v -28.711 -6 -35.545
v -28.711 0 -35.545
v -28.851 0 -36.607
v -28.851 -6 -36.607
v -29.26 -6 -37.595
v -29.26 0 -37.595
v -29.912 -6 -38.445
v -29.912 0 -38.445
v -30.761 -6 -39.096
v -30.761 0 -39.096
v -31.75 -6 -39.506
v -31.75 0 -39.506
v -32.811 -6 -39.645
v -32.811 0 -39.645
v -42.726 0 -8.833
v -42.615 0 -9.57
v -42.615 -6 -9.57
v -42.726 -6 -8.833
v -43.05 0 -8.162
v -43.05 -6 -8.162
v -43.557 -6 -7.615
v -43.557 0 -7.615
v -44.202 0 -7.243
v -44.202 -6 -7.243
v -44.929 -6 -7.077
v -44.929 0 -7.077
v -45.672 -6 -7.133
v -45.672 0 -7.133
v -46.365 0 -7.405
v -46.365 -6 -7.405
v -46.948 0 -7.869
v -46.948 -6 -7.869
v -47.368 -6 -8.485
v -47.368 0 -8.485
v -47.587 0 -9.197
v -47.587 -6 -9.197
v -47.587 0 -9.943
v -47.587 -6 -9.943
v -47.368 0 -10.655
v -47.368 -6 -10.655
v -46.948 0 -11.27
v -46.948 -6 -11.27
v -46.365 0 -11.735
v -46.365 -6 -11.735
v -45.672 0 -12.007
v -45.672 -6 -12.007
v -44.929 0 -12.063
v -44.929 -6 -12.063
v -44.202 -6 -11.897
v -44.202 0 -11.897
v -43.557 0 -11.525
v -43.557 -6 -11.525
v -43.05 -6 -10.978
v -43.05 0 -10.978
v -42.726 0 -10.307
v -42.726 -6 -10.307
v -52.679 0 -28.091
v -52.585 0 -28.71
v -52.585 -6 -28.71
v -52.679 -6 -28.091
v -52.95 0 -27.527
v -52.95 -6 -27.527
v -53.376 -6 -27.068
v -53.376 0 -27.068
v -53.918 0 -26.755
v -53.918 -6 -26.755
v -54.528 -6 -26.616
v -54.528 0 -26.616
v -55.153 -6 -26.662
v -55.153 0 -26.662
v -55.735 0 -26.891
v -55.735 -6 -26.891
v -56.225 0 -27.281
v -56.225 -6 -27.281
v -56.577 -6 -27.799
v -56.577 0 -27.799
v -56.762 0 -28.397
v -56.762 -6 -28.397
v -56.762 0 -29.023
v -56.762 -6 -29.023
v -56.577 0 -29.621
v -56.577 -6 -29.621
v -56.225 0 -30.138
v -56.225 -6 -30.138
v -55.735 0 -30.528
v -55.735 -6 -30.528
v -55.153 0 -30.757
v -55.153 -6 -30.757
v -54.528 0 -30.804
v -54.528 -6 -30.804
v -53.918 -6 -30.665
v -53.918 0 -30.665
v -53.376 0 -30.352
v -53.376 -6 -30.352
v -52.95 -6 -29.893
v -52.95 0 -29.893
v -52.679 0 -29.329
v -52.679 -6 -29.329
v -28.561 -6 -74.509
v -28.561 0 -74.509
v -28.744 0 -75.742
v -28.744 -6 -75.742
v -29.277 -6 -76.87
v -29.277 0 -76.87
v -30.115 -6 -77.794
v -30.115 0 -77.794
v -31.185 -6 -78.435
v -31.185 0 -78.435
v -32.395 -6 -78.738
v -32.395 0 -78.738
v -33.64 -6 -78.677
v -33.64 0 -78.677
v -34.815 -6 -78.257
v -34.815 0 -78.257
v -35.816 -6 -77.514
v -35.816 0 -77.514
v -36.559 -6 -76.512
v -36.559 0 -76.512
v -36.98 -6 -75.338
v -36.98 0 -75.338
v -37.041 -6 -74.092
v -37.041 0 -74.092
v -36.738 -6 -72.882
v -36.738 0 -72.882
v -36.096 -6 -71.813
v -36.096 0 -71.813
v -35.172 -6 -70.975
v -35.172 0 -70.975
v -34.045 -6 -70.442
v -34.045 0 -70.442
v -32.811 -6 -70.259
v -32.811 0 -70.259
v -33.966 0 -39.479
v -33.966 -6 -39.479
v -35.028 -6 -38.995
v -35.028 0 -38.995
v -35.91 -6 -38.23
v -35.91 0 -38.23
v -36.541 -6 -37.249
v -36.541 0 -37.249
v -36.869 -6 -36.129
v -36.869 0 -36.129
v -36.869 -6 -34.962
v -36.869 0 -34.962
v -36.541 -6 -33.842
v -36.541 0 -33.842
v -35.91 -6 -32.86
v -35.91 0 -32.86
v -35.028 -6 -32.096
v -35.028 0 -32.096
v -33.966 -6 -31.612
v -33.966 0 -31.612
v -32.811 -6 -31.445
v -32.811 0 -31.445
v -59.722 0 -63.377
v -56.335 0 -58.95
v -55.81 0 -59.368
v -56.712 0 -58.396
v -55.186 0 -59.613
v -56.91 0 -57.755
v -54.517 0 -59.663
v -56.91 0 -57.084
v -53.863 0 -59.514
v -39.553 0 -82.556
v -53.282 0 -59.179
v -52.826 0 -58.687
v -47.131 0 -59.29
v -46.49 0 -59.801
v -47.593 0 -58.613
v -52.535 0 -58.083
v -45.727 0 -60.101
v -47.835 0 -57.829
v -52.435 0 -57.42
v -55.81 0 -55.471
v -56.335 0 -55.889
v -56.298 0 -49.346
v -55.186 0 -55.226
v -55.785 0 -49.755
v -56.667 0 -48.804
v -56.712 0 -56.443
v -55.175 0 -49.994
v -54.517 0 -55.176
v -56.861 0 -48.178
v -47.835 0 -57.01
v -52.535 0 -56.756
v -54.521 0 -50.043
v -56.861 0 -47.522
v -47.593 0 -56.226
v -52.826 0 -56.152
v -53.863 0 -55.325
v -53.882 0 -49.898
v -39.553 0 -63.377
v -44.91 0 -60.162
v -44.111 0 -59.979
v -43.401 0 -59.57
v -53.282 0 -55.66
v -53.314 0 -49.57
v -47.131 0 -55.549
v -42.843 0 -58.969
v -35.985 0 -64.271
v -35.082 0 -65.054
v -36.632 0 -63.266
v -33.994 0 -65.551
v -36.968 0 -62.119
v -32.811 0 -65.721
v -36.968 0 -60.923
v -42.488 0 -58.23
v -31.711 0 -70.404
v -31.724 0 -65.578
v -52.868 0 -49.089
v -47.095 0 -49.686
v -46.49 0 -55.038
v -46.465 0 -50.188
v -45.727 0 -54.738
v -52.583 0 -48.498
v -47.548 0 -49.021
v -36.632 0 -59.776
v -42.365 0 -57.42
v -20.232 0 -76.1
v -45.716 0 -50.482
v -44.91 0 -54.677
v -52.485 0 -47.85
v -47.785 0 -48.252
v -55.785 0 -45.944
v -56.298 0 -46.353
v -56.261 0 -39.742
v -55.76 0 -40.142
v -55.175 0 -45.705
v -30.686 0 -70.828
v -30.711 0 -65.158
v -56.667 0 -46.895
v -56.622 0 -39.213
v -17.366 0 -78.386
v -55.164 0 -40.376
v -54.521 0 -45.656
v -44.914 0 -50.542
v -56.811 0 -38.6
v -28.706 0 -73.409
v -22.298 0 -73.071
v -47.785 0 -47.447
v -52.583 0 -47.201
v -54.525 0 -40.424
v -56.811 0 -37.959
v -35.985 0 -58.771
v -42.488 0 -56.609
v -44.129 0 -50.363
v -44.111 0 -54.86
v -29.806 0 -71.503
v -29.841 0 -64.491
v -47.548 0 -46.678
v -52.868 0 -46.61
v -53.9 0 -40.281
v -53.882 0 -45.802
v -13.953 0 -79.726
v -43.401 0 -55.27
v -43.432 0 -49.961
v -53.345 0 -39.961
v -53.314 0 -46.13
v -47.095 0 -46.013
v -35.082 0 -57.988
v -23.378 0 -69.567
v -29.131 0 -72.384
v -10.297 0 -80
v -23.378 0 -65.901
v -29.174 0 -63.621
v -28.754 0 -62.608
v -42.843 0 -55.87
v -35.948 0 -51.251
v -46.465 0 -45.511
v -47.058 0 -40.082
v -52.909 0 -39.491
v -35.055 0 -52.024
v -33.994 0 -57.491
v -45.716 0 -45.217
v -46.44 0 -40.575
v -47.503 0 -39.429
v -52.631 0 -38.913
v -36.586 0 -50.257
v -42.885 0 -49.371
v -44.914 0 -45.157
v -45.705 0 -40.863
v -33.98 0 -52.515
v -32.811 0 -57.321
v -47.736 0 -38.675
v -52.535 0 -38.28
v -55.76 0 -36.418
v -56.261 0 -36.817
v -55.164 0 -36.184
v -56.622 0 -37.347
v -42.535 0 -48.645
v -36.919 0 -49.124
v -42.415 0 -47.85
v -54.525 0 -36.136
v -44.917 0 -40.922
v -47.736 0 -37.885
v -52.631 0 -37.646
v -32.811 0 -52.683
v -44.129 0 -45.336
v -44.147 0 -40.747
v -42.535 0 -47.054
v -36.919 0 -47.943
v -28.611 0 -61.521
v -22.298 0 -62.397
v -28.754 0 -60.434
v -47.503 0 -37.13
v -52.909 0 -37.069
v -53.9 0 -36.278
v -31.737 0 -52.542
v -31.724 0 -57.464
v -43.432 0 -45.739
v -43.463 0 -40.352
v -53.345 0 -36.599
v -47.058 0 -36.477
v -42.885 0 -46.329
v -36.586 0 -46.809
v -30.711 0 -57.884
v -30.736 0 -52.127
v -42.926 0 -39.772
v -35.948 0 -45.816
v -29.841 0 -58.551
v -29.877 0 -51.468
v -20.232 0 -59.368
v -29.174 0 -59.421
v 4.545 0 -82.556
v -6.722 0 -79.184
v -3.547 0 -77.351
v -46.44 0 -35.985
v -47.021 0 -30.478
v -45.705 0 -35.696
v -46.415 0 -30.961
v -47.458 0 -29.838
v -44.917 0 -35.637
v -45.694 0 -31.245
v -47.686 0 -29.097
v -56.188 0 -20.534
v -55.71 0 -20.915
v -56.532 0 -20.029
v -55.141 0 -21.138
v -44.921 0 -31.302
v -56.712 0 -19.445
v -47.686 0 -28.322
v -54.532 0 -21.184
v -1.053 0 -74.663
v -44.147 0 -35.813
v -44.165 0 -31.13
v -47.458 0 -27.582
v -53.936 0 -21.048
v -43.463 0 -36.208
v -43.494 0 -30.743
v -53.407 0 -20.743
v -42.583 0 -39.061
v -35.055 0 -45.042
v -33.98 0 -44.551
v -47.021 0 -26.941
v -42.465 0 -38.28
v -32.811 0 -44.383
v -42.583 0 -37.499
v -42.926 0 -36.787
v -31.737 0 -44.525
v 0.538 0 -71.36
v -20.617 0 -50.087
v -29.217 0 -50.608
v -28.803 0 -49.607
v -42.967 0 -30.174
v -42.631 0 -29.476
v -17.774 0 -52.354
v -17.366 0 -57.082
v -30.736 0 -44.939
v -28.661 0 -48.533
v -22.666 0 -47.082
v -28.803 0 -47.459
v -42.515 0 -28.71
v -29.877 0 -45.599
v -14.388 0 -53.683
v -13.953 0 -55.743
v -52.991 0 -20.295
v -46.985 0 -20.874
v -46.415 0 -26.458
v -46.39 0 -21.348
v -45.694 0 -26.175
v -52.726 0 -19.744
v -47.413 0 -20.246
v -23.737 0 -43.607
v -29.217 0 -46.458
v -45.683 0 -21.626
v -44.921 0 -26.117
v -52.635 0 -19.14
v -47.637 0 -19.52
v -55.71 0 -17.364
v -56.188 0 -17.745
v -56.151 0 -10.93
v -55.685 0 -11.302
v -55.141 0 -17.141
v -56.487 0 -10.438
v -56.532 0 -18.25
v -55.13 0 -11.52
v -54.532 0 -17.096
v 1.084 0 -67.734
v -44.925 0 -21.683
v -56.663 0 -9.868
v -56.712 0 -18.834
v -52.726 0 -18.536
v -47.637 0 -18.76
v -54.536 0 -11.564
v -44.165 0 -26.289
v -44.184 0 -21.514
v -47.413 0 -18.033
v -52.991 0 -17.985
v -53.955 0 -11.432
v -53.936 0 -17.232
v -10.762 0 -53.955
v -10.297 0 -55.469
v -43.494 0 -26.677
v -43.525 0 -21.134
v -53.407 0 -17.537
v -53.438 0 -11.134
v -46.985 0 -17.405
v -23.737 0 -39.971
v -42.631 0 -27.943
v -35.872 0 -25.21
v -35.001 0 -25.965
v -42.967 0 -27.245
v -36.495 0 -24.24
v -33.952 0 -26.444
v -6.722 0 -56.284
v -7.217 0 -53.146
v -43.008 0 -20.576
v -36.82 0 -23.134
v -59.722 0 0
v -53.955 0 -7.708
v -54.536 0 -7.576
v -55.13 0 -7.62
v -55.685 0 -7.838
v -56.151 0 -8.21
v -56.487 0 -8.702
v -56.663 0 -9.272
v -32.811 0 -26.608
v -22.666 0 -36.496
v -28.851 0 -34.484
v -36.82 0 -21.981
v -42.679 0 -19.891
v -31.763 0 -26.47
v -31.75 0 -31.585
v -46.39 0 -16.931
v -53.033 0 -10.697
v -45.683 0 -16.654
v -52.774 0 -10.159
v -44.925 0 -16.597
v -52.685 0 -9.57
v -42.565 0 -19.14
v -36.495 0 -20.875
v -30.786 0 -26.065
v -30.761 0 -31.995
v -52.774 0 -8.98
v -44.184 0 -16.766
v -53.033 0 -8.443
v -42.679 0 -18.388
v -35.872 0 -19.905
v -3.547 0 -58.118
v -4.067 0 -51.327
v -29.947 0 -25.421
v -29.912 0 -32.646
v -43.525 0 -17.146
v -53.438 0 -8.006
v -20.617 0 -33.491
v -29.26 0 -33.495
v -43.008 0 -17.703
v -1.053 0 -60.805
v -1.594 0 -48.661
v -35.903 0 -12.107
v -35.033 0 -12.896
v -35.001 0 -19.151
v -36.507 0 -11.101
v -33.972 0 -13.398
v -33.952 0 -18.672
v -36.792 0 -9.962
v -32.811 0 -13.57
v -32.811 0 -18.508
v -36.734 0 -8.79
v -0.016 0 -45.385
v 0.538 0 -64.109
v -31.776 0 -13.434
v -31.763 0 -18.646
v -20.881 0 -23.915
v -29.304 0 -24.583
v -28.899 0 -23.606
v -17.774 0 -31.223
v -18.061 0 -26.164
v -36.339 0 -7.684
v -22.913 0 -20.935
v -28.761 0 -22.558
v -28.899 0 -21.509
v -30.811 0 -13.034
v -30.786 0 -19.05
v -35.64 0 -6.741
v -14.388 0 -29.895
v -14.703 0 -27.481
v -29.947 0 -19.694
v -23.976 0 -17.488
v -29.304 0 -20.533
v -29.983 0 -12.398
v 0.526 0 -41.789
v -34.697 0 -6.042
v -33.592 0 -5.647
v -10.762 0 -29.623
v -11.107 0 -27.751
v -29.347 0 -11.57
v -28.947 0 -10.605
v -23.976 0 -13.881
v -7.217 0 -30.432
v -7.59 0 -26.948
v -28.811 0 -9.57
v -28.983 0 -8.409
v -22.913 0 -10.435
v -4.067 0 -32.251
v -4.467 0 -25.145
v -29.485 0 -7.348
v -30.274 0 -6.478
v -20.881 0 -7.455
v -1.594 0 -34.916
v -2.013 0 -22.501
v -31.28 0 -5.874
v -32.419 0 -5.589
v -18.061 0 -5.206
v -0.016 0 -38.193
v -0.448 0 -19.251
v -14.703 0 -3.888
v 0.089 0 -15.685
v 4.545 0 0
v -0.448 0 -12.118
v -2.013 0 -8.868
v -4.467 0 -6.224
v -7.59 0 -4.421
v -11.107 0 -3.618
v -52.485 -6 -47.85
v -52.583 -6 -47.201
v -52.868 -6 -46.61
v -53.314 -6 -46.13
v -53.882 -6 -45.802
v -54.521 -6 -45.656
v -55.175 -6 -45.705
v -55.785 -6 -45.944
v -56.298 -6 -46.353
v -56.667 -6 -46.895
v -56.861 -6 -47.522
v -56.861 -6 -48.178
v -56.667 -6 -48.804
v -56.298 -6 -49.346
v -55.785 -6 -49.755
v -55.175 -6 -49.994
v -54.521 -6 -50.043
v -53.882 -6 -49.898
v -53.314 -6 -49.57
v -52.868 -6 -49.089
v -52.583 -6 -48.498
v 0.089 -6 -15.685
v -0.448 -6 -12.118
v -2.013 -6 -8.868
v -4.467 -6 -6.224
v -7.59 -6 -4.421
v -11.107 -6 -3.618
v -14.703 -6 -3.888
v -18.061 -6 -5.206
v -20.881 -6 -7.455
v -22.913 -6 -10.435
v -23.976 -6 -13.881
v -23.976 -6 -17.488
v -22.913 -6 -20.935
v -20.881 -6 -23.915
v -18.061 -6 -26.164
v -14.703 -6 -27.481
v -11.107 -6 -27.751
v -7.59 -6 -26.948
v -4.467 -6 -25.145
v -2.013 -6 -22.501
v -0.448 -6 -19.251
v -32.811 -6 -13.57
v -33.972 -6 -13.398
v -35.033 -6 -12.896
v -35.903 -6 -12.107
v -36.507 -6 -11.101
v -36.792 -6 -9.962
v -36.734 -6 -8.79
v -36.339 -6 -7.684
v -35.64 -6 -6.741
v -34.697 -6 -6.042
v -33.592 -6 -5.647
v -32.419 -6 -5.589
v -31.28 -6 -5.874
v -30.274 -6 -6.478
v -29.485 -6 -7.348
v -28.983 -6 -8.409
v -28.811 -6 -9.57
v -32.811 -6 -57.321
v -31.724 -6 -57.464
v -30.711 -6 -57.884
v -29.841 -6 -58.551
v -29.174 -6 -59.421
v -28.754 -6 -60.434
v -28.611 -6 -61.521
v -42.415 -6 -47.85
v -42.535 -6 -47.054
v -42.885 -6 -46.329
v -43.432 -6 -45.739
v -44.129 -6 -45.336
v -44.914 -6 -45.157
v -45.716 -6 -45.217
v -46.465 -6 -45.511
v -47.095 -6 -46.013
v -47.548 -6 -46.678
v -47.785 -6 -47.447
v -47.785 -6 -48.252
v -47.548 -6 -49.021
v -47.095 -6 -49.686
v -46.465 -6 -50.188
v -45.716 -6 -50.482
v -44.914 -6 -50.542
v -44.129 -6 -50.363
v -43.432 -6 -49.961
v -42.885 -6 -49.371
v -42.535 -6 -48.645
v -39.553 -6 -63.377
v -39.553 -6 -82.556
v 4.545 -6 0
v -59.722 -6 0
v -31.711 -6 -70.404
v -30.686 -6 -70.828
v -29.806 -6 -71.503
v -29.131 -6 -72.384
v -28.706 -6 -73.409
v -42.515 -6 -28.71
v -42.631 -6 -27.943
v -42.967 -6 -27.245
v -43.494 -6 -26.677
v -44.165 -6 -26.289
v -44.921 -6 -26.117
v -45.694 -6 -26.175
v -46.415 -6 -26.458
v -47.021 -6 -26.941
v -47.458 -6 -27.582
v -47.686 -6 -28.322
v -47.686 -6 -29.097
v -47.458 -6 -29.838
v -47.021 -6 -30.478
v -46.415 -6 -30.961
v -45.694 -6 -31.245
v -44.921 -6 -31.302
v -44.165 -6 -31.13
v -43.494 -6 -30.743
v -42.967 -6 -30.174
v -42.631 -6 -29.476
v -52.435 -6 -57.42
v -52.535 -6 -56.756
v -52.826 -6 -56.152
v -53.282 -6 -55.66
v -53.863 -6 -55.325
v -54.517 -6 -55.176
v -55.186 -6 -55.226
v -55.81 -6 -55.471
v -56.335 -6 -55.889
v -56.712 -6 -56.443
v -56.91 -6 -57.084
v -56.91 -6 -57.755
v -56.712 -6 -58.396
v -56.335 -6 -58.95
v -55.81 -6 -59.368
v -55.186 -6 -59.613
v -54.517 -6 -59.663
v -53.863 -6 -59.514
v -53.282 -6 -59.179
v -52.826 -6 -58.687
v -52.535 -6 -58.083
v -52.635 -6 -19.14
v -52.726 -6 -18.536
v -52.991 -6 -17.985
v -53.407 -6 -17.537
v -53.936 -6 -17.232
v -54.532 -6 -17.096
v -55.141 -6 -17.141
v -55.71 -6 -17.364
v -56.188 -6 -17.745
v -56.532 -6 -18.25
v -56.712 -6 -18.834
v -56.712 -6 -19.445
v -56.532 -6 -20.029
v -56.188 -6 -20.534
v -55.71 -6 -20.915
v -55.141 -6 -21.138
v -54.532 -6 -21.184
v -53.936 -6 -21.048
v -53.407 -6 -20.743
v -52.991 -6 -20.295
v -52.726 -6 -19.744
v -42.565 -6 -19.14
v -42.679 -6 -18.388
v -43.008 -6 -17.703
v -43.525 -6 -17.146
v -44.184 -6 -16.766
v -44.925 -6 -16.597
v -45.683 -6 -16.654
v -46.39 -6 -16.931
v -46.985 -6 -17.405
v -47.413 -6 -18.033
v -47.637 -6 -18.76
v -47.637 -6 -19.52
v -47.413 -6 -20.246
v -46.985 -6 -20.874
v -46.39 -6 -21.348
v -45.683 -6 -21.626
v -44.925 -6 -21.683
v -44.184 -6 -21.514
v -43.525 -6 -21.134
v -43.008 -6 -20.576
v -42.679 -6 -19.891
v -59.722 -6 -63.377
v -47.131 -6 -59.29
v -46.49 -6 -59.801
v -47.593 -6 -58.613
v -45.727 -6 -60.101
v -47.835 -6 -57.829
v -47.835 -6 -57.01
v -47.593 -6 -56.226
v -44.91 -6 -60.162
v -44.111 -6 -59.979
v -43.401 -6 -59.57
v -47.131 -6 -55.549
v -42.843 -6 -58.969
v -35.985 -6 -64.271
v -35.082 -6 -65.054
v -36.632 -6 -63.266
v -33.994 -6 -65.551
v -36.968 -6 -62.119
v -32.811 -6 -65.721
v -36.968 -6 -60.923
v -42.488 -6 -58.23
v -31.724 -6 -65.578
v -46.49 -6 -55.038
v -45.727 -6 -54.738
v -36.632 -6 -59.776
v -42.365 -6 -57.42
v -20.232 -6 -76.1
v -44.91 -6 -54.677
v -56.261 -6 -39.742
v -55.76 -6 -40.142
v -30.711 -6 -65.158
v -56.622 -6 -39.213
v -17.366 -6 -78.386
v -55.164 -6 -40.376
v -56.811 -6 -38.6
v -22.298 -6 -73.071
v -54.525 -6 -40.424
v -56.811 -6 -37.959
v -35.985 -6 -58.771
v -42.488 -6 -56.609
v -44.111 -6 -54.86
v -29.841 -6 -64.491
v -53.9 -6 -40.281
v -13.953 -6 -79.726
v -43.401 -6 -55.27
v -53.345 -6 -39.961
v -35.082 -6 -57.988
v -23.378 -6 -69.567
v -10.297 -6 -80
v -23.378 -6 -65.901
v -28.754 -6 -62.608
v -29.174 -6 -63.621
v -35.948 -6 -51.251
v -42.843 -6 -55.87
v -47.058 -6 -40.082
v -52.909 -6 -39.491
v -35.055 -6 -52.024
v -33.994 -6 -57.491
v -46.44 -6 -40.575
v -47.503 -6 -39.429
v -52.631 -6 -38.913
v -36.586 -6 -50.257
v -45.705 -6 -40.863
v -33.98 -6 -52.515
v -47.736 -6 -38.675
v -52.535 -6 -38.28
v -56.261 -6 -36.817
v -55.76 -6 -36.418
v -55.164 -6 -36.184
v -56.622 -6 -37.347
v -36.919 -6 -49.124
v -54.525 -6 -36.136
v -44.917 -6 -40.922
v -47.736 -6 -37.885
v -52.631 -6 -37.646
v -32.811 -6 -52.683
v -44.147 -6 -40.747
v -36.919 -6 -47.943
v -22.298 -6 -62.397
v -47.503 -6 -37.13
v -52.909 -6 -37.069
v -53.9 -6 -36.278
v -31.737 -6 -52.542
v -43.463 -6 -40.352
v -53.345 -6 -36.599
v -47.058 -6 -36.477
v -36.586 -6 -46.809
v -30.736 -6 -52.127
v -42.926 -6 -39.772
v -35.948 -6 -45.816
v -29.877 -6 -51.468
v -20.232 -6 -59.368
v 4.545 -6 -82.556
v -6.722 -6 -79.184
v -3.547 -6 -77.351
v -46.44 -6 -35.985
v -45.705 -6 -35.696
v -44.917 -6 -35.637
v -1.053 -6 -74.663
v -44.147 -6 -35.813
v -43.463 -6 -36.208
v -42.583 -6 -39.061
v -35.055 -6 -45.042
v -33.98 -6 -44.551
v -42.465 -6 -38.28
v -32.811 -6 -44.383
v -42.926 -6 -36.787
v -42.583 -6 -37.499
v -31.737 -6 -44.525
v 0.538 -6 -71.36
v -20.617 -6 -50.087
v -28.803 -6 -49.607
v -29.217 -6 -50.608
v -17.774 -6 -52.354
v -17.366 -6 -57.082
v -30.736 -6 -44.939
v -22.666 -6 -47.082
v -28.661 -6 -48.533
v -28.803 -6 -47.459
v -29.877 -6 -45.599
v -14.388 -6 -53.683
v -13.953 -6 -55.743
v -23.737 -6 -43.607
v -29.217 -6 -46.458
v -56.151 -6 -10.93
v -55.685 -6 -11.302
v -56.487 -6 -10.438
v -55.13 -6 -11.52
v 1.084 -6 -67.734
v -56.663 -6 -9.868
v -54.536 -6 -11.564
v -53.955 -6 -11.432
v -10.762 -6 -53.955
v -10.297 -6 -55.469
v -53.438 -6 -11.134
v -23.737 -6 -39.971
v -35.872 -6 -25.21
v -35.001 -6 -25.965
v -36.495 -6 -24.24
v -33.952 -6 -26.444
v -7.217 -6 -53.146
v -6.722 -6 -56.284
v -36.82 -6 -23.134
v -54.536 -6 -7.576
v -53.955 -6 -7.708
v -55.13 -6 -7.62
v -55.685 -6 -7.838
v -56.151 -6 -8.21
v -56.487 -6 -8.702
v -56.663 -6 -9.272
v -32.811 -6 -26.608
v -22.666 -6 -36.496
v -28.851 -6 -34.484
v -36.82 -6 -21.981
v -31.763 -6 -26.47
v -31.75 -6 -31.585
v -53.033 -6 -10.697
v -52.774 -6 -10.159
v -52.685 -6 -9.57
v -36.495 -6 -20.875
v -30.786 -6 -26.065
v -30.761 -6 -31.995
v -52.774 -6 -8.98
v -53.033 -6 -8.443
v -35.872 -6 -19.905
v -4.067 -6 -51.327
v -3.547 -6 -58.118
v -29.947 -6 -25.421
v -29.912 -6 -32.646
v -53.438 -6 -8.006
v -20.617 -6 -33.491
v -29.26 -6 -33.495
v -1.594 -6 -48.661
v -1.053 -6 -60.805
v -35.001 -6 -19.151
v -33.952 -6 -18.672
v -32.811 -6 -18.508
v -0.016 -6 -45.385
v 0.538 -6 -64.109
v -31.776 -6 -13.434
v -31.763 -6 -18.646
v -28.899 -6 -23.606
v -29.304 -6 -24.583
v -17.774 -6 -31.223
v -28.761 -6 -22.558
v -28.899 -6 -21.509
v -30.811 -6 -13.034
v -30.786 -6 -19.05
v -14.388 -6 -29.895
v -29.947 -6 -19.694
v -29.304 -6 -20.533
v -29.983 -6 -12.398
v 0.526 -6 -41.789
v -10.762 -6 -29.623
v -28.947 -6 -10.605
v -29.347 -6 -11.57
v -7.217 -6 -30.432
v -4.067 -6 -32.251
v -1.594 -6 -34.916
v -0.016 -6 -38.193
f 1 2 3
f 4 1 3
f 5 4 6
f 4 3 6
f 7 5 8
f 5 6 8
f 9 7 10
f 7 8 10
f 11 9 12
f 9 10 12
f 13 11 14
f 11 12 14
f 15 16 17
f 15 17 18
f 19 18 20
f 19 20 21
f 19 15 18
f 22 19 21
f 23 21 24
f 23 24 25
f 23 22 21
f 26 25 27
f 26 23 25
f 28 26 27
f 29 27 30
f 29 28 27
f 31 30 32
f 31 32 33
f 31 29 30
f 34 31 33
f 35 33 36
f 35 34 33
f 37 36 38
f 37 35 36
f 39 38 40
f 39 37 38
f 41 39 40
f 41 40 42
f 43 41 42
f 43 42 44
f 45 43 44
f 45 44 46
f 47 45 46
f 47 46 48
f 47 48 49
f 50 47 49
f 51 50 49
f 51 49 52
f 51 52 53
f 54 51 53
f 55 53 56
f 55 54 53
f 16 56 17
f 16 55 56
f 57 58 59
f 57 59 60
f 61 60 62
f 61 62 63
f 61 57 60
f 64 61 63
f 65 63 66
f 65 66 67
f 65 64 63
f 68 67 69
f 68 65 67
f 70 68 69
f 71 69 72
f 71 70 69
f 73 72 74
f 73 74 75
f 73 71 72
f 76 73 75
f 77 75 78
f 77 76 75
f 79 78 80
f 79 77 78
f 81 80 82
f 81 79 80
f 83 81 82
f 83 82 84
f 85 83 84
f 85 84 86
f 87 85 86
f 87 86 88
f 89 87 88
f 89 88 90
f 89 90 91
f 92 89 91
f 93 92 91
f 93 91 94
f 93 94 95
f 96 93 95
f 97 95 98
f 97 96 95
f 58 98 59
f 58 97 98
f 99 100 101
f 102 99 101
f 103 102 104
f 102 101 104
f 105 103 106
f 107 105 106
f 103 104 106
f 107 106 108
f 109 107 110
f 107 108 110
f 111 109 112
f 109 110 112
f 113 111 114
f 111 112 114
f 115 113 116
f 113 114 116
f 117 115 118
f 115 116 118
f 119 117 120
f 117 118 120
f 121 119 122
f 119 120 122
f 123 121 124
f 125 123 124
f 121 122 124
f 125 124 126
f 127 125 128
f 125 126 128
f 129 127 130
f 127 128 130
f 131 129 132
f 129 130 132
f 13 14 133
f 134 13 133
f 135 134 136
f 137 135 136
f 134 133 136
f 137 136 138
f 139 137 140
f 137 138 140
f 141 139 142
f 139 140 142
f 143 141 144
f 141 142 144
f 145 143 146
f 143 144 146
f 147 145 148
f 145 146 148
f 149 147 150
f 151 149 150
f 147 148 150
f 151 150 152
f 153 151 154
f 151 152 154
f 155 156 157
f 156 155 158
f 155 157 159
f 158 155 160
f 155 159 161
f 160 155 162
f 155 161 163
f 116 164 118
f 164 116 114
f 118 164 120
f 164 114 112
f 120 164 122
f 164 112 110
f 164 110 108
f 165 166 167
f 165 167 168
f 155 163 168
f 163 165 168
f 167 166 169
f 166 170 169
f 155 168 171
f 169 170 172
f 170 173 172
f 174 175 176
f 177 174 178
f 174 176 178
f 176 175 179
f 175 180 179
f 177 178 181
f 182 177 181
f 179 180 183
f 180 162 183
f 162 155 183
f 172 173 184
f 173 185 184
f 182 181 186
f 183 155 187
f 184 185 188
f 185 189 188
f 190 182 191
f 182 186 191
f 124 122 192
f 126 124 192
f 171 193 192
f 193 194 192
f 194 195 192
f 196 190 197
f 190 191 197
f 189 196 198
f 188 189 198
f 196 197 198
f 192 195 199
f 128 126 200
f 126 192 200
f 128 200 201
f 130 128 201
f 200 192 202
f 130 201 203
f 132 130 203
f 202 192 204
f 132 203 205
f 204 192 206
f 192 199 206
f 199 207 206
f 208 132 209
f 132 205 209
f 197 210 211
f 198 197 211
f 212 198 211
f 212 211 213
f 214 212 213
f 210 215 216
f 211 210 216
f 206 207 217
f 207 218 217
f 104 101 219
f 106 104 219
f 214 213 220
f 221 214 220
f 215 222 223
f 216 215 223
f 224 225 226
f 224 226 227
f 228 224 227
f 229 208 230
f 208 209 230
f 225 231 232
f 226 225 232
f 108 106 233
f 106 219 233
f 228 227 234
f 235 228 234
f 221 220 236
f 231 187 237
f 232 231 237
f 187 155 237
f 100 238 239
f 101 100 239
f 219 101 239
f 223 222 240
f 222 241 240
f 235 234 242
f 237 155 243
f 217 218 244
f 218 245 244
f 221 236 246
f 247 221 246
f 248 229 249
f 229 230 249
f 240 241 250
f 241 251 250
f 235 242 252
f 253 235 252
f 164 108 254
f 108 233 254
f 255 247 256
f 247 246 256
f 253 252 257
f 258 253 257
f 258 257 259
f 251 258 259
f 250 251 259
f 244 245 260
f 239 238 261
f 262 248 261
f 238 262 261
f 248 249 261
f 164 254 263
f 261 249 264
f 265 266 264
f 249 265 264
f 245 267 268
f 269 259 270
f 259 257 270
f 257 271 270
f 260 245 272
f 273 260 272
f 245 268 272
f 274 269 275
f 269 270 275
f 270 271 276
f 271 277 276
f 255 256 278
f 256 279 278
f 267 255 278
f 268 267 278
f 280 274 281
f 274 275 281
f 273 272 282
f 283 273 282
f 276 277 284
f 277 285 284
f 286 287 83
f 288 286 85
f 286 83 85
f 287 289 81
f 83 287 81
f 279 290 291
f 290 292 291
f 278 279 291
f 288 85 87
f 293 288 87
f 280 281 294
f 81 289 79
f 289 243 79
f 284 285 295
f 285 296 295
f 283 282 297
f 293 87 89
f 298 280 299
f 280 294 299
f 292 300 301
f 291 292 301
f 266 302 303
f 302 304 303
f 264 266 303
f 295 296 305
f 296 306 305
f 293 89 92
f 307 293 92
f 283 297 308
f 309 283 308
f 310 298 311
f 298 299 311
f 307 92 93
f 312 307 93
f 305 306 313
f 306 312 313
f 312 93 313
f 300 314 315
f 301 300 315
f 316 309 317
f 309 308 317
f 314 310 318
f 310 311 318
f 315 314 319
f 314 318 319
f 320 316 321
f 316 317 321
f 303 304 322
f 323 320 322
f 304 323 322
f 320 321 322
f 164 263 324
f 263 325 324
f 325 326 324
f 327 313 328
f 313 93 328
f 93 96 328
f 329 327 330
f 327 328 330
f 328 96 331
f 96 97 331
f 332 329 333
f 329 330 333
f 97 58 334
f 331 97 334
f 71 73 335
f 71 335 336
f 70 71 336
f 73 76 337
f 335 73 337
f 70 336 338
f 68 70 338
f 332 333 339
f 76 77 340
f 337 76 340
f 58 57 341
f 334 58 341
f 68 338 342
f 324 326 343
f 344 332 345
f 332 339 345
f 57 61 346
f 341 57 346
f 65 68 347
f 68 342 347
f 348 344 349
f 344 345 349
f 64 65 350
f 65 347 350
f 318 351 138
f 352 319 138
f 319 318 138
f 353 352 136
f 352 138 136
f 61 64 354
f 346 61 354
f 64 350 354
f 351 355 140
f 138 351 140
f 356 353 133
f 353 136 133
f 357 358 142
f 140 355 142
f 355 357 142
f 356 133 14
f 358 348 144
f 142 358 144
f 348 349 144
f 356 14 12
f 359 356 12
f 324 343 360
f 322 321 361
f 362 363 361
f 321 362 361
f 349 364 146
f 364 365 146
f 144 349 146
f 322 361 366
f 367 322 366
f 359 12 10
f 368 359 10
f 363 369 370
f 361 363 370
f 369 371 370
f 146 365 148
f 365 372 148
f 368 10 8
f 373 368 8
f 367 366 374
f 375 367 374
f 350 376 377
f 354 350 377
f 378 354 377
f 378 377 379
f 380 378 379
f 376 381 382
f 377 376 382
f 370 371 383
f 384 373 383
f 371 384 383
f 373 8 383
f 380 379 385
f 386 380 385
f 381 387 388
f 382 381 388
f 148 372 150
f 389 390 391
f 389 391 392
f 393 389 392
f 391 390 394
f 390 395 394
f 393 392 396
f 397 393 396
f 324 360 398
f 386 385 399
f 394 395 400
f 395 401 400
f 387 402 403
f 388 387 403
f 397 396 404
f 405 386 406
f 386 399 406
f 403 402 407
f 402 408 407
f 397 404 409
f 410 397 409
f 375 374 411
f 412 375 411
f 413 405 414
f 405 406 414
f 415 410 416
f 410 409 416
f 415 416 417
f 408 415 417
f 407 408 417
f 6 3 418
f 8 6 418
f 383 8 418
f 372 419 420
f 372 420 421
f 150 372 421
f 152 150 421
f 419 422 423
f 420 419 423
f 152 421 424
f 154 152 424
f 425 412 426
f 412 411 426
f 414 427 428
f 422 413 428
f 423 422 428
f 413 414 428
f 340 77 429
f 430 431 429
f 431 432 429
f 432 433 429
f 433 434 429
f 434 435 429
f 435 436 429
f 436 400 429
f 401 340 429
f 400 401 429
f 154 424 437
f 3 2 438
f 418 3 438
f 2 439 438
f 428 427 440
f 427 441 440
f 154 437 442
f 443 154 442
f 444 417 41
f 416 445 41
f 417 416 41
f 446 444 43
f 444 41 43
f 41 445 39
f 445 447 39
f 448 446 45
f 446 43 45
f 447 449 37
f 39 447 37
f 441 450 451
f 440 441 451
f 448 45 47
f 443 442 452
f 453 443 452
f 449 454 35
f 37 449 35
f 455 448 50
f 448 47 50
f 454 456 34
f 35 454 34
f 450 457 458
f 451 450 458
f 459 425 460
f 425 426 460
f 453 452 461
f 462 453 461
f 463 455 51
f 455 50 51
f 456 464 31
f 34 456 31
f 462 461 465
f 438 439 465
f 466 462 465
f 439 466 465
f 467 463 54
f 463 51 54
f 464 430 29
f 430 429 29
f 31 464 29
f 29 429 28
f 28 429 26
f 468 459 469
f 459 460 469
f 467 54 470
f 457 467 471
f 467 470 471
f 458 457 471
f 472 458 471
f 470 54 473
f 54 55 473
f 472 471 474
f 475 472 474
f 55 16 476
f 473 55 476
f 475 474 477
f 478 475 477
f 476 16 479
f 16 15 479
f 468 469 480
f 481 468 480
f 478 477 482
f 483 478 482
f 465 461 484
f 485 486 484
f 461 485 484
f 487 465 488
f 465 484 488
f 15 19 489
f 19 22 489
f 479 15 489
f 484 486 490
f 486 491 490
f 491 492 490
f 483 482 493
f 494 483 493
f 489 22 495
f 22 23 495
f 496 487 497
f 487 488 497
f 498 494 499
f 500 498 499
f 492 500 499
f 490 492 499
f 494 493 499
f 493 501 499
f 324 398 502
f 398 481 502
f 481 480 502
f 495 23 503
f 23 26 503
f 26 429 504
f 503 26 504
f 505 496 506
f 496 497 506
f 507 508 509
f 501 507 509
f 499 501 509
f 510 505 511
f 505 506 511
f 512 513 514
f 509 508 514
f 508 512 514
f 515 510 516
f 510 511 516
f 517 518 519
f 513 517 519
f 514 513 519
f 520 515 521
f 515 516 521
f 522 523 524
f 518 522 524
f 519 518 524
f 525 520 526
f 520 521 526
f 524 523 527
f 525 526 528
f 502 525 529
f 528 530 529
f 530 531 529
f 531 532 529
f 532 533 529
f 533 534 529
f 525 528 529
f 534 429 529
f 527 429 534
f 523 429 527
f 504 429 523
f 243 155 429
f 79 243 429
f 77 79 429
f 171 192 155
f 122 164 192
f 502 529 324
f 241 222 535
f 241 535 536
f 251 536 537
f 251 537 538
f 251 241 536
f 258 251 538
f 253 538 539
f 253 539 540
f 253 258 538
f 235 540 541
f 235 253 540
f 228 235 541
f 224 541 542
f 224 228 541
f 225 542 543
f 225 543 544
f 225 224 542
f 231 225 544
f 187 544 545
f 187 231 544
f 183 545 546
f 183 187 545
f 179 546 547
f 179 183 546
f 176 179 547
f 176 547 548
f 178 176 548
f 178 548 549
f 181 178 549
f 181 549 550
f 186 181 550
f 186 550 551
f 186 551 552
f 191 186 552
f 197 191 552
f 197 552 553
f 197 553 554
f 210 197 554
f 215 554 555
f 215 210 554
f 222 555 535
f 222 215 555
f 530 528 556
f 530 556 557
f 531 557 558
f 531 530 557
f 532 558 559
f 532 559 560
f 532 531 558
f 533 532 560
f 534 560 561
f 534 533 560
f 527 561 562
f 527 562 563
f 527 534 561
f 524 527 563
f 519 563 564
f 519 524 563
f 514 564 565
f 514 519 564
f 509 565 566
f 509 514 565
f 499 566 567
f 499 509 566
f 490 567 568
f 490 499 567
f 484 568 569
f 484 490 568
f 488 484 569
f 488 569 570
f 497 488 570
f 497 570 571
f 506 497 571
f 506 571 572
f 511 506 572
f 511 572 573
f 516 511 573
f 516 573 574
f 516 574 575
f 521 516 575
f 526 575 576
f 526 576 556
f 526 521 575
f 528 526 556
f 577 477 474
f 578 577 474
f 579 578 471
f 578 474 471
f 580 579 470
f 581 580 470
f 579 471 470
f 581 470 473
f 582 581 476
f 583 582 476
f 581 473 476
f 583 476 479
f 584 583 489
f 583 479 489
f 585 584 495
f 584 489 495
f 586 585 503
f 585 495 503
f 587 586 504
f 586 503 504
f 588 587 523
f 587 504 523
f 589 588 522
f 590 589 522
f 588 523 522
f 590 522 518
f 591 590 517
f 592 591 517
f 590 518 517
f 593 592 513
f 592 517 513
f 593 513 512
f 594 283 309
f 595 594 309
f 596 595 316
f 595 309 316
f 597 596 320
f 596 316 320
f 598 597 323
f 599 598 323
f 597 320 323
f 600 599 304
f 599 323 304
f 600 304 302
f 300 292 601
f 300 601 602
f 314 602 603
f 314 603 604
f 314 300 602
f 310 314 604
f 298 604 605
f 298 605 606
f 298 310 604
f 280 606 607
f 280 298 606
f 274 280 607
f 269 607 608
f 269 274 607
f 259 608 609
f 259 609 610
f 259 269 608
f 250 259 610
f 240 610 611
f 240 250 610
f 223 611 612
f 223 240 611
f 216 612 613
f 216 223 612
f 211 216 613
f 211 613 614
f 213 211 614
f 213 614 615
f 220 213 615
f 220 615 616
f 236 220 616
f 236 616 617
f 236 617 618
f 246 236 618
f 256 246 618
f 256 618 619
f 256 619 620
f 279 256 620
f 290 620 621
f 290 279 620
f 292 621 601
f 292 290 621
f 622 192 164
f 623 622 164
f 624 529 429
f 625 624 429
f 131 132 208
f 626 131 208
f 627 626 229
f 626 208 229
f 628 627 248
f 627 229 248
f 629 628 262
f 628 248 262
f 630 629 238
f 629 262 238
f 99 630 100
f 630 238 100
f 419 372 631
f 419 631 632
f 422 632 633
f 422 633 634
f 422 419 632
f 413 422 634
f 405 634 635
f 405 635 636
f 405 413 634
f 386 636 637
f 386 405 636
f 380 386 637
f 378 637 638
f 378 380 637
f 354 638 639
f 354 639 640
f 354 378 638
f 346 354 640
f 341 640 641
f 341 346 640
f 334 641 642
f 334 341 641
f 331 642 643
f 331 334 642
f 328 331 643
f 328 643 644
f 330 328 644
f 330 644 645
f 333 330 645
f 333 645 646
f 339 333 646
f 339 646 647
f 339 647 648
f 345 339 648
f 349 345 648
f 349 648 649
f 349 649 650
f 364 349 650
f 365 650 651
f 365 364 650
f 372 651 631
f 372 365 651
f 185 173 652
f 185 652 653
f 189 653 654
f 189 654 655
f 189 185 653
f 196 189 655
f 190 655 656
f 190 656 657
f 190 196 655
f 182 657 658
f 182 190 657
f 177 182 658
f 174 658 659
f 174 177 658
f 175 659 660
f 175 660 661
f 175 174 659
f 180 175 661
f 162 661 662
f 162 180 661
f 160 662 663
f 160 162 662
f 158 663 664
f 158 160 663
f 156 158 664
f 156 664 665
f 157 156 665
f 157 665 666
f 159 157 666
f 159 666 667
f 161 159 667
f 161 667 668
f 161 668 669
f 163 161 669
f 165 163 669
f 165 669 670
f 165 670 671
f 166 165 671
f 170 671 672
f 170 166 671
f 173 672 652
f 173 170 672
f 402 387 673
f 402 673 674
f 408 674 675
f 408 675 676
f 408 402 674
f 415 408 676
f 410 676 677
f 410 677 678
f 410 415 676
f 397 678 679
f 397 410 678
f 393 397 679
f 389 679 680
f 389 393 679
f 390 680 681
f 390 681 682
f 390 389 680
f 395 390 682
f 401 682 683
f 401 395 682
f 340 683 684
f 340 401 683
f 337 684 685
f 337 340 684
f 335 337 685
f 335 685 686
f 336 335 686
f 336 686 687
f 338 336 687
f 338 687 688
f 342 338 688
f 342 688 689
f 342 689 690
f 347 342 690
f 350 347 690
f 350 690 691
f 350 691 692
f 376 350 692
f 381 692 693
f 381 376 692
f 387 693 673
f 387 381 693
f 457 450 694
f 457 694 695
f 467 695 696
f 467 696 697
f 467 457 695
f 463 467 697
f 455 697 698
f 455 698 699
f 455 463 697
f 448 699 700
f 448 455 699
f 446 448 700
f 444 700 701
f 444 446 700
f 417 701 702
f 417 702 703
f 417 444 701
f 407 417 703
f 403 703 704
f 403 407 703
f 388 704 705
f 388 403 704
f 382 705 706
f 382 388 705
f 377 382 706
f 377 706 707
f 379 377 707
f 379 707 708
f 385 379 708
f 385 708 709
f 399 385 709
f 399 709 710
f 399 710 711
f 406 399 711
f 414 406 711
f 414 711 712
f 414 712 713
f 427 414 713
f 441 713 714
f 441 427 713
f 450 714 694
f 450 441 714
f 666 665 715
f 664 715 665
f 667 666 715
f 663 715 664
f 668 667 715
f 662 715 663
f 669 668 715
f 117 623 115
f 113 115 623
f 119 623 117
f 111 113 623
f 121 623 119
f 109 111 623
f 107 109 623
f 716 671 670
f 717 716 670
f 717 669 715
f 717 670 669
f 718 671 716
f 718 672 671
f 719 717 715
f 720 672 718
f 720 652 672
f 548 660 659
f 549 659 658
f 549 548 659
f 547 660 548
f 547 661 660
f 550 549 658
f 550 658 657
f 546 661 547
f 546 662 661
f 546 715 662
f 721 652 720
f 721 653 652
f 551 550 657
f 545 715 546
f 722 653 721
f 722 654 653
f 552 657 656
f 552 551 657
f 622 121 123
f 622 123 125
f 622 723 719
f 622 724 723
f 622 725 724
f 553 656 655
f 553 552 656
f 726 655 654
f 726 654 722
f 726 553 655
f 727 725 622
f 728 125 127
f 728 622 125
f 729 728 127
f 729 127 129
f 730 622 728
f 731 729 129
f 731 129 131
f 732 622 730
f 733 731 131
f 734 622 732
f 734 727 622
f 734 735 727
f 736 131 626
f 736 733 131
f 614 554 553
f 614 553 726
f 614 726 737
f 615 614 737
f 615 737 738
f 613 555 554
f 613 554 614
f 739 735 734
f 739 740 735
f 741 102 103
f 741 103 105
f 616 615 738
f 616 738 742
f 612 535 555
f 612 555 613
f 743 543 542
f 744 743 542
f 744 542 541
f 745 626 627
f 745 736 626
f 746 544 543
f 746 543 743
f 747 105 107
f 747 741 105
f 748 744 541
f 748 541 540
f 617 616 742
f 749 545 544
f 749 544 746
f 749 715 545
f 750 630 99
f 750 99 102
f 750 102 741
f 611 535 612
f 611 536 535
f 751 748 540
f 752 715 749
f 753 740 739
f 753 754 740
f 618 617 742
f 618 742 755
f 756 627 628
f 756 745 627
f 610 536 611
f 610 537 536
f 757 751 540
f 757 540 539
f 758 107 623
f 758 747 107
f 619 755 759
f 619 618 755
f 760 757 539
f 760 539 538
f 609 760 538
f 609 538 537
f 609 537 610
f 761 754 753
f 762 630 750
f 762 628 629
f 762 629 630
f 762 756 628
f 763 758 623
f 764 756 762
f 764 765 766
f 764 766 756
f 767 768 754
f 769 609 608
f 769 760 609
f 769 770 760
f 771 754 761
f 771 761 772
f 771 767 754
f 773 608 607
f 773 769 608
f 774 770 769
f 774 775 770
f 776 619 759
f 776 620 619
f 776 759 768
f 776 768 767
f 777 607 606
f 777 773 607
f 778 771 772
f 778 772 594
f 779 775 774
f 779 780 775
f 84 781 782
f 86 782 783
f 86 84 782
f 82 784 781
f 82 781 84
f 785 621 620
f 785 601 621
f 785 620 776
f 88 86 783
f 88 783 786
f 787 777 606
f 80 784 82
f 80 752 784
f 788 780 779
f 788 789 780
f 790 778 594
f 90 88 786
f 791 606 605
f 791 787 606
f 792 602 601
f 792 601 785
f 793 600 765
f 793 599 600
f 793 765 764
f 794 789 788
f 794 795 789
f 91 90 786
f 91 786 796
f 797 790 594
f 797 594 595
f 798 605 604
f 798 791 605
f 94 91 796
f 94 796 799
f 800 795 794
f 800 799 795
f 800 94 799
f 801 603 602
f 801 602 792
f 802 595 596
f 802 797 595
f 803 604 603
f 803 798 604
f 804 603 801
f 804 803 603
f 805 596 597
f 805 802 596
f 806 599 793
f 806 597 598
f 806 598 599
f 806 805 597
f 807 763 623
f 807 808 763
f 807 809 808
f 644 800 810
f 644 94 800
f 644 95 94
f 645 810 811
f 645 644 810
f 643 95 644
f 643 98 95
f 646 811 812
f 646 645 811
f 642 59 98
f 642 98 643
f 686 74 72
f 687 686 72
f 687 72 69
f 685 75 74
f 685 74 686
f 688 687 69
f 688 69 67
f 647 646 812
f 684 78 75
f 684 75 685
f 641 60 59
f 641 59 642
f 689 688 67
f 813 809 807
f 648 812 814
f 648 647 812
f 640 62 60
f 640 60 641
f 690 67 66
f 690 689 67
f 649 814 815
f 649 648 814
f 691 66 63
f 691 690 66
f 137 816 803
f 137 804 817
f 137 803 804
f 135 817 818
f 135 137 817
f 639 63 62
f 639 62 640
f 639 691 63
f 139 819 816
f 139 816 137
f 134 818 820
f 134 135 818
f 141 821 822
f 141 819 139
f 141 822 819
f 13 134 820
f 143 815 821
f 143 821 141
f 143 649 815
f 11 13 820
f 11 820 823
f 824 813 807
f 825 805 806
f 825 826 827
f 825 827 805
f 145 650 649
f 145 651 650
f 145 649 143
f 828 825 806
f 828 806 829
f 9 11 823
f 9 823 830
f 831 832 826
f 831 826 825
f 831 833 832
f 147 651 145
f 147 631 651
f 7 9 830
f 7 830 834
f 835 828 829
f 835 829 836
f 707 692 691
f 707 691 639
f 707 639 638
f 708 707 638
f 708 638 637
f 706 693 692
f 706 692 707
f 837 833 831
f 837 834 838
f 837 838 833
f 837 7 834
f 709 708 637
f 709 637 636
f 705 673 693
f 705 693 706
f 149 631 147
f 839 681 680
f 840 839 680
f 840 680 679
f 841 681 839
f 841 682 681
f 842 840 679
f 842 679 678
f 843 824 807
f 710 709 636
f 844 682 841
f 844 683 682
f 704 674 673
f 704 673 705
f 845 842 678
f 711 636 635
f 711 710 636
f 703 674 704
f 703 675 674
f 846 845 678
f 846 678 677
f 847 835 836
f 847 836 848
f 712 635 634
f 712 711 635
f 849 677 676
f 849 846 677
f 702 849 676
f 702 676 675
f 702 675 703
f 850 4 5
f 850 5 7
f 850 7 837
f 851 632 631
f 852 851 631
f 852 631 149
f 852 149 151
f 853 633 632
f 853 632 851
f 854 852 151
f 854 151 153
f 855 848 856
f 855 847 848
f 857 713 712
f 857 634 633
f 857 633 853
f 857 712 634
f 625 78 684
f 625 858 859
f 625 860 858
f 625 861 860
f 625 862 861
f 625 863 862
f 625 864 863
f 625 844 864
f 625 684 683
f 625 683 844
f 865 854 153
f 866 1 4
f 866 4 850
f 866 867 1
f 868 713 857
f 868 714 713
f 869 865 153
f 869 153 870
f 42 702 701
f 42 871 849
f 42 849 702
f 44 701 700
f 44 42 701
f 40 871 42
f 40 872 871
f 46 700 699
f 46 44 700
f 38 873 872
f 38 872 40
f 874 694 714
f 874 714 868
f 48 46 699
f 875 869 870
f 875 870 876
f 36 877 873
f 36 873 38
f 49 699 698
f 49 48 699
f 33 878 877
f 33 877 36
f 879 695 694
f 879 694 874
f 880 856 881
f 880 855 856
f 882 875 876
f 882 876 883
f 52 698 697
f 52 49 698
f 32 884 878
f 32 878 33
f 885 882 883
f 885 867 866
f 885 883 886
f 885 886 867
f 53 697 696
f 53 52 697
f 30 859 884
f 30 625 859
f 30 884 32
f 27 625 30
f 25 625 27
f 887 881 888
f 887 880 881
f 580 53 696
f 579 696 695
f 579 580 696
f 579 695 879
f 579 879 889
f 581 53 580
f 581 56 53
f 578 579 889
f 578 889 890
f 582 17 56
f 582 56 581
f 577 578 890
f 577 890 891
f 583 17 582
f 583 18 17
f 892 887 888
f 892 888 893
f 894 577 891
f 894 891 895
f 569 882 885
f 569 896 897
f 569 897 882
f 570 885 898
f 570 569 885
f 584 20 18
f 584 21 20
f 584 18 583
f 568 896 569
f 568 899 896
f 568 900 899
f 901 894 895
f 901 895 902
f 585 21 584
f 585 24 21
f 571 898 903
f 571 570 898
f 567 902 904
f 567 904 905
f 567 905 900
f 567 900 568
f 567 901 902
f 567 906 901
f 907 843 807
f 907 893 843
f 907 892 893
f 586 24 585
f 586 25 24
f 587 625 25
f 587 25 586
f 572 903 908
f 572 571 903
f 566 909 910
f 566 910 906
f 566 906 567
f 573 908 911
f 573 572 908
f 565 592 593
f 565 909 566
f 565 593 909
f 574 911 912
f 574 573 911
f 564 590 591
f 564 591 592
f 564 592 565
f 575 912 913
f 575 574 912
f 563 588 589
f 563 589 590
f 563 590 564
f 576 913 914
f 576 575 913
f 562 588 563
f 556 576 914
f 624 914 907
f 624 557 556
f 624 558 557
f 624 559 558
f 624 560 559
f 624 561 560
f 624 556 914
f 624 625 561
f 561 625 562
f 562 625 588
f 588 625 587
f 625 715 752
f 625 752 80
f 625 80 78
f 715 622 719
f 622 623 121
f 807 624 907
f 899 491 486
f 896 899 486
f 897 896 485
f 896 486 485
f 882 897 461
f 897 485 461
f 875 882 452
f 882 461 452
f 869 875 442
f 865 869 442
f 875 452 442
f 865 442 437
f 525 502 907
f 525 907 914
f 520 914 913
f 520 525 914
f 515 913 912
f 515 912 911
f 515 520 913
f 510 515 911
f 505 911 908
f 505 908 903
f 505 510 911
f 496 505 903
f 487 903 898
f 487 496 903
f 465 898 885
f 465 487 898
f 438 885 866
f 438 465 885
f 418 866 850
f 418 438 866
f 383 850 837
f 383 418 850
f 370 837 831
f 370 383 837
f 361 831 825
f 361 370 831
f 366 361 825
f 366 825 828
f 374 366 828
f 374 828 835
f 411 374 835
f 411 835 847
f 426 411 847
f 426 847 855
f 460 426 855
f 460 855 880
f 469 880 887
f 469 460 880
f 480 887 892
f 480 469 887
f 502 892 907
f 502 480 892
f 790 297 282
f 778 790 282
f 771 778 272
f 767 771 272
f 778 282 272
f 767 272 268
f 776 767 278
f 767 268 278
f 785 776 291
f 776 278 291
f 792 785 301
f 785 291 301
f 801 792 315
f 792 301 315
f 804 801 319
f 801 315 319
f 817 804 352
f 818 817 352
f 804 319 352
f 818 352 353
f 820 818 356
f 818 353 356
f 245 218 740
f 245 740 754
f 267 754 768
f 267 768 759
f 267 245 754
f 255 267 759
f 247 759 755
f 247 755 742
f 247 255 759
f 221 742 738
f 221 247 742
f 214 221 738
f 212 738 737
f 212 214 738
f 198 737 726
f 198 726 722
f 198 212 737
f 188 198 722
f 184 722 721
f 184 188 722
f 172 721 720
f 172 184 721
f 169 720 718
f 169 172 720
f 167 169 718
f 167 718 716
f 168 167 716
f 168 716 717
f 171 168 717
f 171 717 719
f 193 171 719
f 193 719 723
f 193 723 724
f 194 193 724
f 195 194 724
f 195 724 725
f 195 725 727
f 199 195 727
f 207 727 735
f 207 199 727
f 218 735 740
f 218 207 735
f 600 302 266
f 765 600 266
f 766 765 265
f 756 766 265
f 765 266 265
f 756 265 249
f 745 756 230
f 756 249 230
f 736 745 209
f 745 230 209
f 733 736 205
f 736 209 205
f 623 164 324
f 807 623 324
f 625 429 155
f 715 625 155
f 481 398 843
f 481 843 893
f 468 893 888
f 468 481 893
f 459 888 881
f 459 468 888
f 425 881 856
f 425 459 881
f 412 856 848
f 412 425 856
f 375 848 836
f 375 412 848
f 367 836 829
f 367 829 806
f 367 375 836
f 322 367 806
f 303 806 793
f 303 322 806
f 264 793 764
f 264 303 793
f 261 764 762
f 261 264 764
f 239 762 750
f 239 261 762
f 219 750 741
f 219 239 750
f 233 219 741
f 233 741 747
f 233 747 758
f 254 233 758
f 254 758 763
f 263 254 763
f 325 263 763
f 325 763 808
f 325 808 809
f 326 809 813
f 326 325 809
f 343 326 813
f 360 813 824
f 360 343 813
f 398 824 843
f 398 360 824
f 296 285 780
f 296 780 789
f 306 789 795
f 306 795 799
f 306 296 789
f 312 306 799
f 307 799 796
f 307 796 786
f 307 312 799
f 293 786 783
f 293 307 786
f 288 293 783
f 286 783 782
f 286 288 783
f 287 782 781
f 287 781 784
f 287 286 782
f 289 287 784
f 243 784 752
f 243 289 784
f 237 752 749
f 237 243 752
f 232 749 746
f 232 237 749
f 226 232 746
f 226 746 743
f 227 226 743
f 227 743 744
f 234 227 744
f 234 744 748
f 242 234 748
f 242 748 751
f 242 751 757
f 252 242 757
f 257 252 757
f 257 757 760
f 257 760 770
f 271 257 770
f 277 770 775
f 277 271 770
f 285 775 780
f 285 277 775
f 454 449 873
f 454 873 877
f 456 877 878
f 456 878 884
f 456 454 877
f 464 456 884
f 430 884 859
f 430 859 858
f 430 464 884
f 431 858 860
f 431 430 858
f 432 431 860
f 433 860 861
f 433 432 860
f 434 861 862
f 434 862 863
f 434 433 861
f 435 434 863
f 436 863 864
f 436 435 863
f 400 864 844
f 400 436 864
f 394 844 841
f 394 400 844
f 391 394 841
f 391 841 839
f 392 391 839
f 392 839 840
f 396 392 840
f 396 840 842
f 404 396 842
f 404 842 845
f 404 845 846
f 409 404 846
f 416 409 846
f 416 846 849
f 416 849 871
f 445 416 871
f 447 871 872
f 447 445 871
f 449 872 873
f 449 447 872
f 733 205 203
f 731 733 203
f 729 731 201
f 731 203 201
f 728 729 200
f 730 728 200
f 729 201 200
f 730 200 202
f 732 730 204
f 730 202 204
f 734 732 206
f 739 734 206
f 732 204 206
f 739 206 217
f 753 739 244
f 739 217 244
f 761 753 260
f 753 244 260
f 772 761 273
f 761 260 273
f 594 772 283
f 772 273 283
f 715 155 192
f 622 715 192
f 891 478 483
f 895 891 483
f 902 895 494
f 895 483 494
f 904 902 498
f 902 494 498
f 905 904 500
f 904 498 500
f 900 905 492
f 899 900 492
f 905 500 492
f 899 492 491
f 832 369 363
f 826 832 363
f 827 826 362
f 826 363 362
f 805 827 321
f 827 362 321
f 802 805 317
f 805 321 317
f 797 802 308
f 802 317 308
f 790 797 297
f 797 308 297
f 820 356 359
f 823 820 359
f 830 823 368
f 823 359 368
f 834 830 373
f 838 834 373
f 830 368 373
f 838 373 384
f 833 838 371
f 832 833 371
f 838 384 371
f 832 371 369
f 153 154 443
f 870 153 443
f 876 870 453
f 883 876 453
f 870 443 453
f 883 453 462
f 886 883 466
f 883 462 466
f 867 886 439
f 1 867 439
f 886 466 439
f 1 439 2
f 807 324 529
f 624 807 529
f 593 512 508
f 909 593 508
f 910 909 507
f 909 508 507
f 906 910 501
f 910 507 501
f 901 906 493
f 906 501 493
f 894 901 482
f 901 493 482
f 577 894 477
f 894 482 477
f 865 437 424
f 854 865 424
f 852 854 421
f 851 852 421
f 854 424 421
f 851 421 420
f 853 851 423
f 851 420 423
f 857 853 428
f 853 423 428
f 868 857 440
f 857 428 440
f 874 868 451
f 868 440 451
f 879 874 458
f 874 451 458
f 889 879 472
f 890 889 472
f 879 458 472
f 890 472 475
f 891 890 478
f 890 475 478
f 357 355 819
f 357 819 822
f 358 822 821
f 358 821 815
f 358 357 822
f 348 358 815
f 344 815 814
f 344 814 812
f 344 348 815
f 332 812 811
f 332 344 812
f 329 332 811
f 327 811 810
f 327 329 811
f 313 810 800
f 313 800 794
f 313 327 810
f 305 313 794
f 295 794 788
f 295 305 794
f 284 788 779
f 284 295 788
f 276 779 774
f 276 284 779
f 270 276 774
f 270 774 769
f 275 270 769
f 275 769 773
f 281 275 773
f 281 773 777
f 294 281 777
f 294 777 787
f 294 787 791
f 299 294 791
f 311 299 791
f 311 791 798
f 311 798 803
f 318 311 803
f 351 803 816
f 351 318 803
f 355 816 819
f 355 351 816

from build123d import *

# Parameters (mm, degrees)
F0_R     = 2.25
F0_R_2   = 2.75
F0_R_3   = 2.2
F0_R_4   = 2.7
F0_R_5   = 12.3
F0_R_6   = 12.2
F0_R_7   = 2.15
F0_R_8   = 2.65
F0_R_9   = 2.1
F0_R_10  = 2.6
F0_R_11  = 2.05
F0_R_12  = 2.55
F0_R_13  = 2
F0_R_14  = 2.5
F0_R_15  = 12.1
F1_DEPTH = 6


with BuildPart() as f1:
    # F0 (on Front) → F1 (new body)
    with BuildSketch(Plane.XZ):
        Polygon((4.545036, 0), (0, 0), (-54.685275, 0), (-59.722289, 0), (-59.722289, -63.376926), (-39.553031, -63.376926), (-39.553031, -82.555786), (4.545036, -82.555786), align=None)
        with BuildLine():
            ThreePointArc((-28.561165, -74.508687), (-35.816369, -77.513891), (-32.811165, -70.258687))
            ThreePointArc((-32.811165, -70.258687), (-29.805961, -71.503483), (-28.561165, -74.508687))
        make_face(mode=Mode.SUBTRACT)
        with Locations((-54.685275, -57.419539)):
            Circle(F0_R, mode=Mode.SUBTRACT)
        with Locations((-45.115352, -57.419539)):
            Circle(F0_R_2, mode=Mode.SUBTRACT)
        with Locations((-54.685275, -47.849615)):
            Circle(F0_R_3, mode=Mode.SUBTRACT)
        with Locations((-45.115352, -47.849615)):
            Circle(F0_R_4, mode=Mode.SUBTRACT)
        with BuildLine():
            ThreePointArc((-32.811165, -65.720934), (-37.011165, -61.520934), (-32.811165, -57.320934))
            ThreePointArc((-32.811165, -57.320934), (-29.841316, -58.551086), (-28.611165, -61.520934))
            ThreePointArc((-28.611165, -61.520934), (-29.841316, -64.490783), (-32.811165, -65.720934))
        make_face(mode=Mode.SUBTRACT)
        with BuildLine():
            ThreePointArc((-32.811165, -52.683181), (-36.961165, -48.533181), (-32.811165, -44.383181))
            ThreePointArc((-32.811165, -44.383181), (-29.876672, -45.598688), (-28.661165, -48.533181))
            ThreePointArc((-28.661165, -48.533181), (-29.876672, -51.467675), (-32.811165, -52.683181))
        make_face(mode=Mode.SUBTRACT)
        with Locations((-11.215762, -67.734145)):
            Circle(F0_R_5, mode=Mode.SUBTRACT)
        with Locations((-11.673733, -41.788895)):
            Circle(F0_R_6, mode=Mode.SUBTRACT)
        with Locations((-54.685275, -38.279692)):
            Circle(F0_R_7, mode=Mode.SUBTRACT)
        with Locations((-45.115352, -38.279692)):
            Circle(F0_R_8, mode=Mode.SUBTRACT)
        with Locations((-54.685275, -28.709769)):
            Circle(F0_R_9, mode=Mode.SUBTRACT)
        with Locations((-45.115352, -28.709769)):
            Circle(F0_R_10, mode=Mode.SUBTRACT)
        with BuildLine():
            ThreePointArc((-32.811165, -39.645429), (-36.911165, -35.545429), (-32.811165, -31.445429))
            ThreePointArc((-32.811165, -31.445429), (-29.912027, -32.646291), (-28.711165, -35.545429))
            ThreePointArc((-28.711165, -35.545429), (-29.912027, -38.444566), (-32.811165, -39.645429))
        make_face(mode=Mode.SUBTRACT)
        with BuildLine():
            ThreePointArc((-32.811165, -26.607676), (-36.861165, -22.557676), (-32.811165, -18.507676))
            ThreePointArc((-32.811165, -18.507676), (-29.947382, -19.693893), (-28.761165, -22.557676))
            ThreePointArc((-28.761165, -22.557676), (-29.947382, -25.421458), (-32.811165, -26.607676))
        make_face(mode=Mode.SUBTRACT)
        with Locations((-54.685275, -19.139846)):
            Circle(F0_R_11, mode=Mode.SUBTRACT)
        with Locations((-45.115352, -19.139846)):
            Circle(F0_R_12, mode=Mode.SUBTRACT)
        with Locations((-54.685275, -9.569923)):
            Circle(F0_R_13, mode=Mode.SUBTRACT)
        with Locations((-45.115352, -9.569923)):
            Circle(F0_R_14, mode=Mode.SUBTRACT)
        with BuildLine():
            ThreePointArc((-32.811165, -13.569923), (-35.639592, -6.741496), (-28.811165, -9.569923))
            ThreePointArc((-28.811165, -9.569923), (-29.982738, -12.39835), (-32.811165, -13.569923))
        make_face(mode=Mode.SUBTRACT)
        with Locations((-12.010878, -15.684631)):
            Circle(F0_R_15, mode=Mode.SUBTRACT)
    extrude(amount=F1_DEPTH)


solid = f1.part
